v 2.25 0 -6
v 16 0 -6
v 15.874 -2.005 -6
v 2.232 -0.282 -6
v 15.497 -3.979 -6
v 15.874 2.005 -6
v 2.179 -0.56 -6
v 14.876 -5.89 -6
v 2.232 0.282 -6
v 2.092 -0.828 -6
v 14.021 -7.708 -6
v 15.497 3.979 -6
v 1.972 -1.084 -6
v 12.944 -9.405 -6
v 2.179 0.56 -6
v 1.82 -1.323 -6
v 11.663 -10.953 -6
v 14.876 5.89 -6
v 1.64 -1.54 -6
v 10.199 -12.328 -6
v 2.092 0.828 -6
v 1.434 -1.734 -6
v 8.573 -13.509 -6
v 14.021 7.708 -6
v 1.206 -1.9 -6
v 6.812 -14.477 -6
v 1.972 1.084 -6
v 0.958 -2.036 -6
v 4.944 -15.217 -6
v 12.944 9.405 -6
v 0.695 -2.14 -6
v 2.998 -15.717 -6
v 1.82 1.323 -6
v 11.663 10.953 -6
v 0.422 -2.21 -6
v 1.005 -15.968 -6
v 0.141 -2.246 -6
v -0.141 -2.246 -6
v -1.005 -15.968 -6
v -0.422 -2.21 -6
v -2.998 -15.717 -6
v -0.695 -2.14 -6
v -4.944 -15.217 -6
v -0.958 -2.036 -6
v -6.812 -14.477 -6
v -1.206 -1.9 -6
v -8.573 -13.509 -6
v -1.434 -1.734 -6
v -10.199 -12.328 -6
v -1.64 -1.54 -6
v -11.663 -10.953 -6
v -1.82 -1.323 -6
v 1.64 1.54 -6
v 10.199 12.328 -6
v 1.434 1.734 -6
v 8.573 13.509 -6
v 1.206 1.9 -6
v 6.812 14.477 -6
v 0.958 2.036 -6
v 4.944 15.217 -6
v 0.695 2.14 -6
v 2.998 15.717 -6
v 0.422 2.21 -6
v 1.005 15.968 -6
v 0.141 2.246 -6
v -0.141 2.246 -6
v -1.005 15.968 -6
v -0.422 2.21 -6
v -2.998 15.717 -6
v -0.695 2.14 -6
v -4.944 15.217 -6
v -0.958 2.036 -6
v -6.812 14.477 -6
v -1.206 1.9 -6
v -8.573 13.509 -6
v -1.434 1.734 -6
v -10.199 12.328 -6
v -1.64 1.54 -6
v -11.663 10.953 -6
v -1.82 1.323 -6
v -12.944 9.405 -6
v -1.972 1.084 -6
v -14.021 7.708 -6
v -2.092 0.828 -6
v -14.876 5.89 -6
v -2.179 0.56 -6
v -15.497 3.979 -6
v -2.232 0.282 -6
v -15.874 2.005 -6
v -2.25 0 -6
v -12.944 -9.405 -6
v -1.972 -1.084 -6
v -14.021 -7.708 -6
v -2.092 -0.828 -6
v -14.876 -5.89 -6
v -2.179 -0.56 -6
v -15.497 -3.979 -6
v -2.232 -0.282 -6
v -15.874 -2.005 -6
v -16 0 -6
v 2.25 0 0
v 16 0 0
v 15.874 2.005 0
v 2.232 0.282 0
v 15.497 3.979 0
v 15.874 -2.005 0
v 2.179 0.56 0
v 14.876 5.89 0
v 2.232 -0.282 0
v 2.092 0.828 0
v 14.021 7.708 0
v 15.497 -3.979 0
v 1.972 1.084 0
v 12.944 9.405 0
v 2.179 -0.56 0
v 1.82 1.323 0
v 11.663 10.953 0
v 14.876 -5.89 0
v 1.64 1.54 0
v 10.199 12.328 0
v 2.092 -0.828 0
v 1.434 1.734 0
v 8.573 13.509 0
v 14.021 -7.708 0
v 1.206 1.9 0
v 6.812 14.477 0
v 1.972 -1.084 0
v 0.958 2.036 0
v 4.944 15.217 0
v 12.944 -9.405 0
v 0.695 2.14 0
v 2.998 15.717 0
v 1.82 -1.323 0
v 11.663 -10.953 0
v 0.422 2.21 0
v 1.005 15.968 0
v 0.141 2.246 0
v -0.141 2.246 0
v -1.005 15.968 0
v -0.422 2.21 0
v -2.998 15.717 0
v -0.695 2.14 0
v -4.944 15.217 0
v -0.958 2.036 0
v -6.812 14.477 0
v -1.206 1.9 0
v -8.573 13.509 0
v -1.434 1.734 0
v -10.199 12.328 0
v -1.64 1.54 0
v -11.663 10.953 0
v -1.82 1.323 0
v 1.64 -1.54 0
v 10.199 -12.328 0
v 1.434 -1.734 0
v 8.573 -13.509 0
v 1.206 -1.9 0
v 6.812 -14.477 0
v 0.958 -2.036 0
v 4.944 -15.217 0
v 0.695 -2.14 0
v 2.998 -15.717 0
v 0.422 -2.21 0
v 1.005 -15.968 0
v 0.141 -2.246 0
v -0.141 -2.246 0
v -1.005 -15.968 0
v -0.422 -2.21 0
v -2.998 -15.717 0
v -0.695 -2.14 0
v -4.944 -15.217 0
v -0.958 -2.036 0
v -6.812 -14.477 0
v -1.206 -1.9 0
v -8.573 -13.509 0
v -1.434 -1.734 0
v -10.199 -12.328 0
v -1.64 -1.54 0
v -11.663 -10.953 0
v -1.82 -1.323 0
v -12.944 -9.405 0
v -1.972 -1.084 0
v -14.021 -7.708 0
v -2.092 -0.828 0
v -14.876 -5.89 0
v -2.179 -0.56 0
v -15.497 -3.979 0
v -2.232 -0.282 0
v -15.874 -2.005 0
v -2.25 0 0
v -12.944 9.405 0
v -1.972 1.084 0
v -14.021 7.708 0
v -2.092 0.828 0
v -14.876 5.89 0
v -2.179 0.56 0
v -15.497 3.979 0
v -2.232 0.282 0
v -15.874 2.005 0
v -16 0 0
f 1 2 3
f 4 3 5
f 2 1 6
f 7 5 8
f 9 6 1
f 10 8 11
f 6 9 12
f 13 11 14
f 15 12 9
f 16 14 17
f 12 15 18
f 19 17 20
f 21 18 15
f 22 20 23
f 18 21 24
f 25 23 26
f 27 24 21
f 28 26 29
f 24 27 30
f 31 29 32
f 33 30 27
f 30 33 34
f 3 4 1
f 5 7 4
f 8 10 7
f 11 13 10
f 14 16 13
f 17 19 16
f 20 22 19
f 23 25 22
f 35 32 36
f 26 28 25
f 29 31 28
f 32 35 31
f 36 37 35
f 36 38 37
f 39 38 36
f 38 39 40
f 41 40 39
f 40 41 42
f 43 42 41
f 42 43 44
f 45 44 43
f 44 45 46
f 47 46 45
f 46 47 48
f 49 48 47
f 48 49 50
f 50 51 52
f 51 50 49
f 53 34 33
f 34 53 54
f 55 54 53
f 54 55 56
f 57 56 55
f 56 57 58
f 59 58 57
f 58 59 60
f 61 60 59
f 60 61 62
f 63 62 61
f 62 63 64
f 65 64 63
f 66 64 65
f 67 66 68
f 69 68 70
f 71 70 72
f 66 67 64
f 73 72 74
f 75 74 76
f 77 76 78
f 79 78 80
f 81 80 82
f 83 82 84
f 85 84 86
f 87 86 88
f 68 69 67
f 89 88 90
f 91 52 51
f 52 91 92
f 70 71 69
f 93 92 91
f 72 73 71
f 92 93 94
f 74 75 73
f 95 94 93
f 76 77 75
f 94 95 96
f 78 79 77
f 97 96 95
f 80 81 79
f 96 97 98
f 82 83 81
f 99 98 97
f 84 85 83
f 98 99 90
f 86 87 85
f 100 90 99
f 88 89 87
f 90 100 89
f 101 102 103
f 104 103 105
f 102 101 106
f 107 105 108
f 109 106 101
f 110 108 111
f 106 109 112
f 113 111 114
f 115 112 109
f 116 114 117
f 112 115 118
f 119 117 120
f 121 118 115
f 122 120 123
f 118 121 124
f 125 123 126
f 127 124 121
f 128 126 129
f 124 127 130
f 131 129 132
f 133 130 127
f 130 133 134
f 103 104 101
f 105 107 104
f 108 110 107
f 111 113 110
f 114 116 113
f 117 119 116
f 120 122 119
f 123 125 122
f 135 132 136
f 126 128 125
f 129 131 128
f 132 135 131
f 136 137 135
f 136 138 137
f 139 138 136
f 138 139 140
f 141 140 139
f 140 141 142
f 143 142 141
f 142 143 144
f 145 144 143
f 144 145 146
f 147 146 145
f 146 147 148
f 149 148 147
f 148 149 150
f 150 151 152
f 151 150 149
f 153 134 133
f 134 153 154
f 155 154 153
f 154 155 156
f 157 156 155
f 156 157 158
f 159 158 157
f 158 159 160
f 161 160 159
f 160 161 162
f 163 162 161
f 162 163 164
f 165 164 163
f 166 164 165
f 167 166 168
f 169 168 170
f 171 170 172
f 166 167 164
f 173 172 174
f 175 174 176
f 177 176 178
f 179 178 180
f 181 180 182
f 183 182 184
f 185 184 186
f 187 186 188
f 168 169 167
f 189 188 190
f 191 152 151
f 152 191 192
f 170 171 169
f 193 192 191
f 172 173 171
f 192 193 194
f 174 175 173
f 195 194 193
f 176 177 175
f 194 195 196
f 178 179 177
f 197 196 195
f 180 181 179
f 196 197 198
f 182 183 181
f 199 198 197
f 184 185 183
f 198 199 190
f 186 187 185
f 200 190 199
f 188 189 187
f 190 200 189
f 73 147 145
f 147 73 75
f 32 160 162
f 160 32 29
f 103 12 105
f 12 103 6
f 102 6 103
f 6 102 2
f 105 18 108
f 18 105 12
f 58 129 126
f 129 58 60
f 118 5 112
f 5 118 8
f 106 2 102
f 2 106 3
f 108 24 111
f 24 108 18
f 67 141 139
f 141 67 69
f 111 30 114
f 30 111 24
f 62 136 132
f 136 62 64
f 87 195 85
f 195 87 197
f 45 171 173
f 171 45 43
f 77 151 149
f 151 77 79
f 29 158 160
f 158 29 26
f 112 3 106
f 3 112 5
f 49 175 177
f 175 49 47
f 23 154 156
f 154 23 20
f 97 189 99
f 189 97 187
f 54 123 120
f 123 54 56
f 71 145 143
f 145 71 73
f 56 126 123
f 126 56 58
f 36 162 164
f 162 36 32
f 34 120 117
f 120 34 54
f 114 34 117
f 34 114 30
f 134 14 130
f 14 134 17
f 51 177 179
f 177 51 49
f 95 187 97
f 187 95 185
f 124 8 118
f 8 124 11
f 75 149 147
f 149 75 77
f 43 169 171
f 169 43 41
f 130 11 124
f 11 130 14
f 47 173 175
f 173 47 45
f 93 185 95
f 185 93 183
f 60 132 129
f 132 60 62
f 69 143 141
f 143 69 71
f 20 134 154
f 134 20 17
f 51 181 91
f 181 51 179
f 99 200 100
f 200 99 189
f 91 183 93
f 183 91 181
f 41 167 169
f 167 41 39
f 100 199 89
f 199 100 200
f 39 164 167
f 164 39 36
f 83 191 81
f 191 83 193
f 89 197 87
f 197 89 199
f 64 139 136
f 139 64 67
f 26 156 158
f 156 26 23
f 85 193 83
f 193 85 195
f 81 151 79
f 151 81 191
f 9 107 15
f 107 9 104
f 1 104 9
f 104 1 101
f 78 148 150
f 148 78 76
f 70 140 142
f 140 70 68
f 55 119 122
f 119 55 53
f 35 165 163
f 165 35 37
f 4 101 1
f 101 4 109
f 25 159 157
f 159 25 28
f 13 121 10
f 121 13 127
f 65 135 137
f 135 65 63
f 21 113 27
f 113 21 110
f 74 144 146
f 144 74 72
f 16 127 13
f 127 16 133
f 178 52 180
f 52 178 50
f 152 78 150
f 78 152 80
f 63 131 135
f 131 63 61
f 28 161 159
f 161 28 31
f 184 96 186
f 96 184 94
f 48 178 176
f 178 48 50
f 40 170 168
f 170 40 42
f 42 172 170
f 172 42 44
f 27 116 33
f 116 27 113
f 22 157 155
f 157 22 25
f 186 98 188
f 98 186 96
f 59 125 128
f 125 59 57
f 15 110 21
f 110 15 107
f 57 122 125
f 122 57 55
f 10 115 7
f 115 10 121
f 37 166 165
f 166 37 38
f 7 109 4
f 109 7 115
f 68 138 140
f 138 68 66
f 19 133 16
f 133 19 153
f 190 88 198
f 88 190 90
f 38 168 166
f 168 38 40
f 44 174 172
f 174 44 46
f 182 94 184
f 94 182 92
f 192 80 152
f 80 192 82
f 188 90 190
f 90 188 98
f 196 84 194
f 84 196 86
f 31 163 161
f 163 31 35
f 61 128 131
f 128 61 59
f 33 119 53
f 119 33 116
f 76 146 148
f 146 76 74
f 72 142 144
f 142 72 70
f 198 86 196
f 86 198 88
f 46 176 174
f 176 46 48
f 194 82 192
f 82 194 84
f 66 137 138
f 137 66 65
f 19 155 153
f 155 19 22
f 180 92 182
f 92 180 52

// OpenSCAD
$fn = 50;


difference() {
	union() {
		translate(v = [0, 0, -6.0000000000]) {
			cylinder(h = 6, r = 10.0000000000);
		}
		translate(v = [0, 0, -6.0000000000]) {
			cylinder(h = 6, r = 16.0000000000);
		}
	}
	union() {
		#translate(v = [0, 0, -6]) {
			cylinder(h = 6, r = 2.2500000000);
		}
	}
}
